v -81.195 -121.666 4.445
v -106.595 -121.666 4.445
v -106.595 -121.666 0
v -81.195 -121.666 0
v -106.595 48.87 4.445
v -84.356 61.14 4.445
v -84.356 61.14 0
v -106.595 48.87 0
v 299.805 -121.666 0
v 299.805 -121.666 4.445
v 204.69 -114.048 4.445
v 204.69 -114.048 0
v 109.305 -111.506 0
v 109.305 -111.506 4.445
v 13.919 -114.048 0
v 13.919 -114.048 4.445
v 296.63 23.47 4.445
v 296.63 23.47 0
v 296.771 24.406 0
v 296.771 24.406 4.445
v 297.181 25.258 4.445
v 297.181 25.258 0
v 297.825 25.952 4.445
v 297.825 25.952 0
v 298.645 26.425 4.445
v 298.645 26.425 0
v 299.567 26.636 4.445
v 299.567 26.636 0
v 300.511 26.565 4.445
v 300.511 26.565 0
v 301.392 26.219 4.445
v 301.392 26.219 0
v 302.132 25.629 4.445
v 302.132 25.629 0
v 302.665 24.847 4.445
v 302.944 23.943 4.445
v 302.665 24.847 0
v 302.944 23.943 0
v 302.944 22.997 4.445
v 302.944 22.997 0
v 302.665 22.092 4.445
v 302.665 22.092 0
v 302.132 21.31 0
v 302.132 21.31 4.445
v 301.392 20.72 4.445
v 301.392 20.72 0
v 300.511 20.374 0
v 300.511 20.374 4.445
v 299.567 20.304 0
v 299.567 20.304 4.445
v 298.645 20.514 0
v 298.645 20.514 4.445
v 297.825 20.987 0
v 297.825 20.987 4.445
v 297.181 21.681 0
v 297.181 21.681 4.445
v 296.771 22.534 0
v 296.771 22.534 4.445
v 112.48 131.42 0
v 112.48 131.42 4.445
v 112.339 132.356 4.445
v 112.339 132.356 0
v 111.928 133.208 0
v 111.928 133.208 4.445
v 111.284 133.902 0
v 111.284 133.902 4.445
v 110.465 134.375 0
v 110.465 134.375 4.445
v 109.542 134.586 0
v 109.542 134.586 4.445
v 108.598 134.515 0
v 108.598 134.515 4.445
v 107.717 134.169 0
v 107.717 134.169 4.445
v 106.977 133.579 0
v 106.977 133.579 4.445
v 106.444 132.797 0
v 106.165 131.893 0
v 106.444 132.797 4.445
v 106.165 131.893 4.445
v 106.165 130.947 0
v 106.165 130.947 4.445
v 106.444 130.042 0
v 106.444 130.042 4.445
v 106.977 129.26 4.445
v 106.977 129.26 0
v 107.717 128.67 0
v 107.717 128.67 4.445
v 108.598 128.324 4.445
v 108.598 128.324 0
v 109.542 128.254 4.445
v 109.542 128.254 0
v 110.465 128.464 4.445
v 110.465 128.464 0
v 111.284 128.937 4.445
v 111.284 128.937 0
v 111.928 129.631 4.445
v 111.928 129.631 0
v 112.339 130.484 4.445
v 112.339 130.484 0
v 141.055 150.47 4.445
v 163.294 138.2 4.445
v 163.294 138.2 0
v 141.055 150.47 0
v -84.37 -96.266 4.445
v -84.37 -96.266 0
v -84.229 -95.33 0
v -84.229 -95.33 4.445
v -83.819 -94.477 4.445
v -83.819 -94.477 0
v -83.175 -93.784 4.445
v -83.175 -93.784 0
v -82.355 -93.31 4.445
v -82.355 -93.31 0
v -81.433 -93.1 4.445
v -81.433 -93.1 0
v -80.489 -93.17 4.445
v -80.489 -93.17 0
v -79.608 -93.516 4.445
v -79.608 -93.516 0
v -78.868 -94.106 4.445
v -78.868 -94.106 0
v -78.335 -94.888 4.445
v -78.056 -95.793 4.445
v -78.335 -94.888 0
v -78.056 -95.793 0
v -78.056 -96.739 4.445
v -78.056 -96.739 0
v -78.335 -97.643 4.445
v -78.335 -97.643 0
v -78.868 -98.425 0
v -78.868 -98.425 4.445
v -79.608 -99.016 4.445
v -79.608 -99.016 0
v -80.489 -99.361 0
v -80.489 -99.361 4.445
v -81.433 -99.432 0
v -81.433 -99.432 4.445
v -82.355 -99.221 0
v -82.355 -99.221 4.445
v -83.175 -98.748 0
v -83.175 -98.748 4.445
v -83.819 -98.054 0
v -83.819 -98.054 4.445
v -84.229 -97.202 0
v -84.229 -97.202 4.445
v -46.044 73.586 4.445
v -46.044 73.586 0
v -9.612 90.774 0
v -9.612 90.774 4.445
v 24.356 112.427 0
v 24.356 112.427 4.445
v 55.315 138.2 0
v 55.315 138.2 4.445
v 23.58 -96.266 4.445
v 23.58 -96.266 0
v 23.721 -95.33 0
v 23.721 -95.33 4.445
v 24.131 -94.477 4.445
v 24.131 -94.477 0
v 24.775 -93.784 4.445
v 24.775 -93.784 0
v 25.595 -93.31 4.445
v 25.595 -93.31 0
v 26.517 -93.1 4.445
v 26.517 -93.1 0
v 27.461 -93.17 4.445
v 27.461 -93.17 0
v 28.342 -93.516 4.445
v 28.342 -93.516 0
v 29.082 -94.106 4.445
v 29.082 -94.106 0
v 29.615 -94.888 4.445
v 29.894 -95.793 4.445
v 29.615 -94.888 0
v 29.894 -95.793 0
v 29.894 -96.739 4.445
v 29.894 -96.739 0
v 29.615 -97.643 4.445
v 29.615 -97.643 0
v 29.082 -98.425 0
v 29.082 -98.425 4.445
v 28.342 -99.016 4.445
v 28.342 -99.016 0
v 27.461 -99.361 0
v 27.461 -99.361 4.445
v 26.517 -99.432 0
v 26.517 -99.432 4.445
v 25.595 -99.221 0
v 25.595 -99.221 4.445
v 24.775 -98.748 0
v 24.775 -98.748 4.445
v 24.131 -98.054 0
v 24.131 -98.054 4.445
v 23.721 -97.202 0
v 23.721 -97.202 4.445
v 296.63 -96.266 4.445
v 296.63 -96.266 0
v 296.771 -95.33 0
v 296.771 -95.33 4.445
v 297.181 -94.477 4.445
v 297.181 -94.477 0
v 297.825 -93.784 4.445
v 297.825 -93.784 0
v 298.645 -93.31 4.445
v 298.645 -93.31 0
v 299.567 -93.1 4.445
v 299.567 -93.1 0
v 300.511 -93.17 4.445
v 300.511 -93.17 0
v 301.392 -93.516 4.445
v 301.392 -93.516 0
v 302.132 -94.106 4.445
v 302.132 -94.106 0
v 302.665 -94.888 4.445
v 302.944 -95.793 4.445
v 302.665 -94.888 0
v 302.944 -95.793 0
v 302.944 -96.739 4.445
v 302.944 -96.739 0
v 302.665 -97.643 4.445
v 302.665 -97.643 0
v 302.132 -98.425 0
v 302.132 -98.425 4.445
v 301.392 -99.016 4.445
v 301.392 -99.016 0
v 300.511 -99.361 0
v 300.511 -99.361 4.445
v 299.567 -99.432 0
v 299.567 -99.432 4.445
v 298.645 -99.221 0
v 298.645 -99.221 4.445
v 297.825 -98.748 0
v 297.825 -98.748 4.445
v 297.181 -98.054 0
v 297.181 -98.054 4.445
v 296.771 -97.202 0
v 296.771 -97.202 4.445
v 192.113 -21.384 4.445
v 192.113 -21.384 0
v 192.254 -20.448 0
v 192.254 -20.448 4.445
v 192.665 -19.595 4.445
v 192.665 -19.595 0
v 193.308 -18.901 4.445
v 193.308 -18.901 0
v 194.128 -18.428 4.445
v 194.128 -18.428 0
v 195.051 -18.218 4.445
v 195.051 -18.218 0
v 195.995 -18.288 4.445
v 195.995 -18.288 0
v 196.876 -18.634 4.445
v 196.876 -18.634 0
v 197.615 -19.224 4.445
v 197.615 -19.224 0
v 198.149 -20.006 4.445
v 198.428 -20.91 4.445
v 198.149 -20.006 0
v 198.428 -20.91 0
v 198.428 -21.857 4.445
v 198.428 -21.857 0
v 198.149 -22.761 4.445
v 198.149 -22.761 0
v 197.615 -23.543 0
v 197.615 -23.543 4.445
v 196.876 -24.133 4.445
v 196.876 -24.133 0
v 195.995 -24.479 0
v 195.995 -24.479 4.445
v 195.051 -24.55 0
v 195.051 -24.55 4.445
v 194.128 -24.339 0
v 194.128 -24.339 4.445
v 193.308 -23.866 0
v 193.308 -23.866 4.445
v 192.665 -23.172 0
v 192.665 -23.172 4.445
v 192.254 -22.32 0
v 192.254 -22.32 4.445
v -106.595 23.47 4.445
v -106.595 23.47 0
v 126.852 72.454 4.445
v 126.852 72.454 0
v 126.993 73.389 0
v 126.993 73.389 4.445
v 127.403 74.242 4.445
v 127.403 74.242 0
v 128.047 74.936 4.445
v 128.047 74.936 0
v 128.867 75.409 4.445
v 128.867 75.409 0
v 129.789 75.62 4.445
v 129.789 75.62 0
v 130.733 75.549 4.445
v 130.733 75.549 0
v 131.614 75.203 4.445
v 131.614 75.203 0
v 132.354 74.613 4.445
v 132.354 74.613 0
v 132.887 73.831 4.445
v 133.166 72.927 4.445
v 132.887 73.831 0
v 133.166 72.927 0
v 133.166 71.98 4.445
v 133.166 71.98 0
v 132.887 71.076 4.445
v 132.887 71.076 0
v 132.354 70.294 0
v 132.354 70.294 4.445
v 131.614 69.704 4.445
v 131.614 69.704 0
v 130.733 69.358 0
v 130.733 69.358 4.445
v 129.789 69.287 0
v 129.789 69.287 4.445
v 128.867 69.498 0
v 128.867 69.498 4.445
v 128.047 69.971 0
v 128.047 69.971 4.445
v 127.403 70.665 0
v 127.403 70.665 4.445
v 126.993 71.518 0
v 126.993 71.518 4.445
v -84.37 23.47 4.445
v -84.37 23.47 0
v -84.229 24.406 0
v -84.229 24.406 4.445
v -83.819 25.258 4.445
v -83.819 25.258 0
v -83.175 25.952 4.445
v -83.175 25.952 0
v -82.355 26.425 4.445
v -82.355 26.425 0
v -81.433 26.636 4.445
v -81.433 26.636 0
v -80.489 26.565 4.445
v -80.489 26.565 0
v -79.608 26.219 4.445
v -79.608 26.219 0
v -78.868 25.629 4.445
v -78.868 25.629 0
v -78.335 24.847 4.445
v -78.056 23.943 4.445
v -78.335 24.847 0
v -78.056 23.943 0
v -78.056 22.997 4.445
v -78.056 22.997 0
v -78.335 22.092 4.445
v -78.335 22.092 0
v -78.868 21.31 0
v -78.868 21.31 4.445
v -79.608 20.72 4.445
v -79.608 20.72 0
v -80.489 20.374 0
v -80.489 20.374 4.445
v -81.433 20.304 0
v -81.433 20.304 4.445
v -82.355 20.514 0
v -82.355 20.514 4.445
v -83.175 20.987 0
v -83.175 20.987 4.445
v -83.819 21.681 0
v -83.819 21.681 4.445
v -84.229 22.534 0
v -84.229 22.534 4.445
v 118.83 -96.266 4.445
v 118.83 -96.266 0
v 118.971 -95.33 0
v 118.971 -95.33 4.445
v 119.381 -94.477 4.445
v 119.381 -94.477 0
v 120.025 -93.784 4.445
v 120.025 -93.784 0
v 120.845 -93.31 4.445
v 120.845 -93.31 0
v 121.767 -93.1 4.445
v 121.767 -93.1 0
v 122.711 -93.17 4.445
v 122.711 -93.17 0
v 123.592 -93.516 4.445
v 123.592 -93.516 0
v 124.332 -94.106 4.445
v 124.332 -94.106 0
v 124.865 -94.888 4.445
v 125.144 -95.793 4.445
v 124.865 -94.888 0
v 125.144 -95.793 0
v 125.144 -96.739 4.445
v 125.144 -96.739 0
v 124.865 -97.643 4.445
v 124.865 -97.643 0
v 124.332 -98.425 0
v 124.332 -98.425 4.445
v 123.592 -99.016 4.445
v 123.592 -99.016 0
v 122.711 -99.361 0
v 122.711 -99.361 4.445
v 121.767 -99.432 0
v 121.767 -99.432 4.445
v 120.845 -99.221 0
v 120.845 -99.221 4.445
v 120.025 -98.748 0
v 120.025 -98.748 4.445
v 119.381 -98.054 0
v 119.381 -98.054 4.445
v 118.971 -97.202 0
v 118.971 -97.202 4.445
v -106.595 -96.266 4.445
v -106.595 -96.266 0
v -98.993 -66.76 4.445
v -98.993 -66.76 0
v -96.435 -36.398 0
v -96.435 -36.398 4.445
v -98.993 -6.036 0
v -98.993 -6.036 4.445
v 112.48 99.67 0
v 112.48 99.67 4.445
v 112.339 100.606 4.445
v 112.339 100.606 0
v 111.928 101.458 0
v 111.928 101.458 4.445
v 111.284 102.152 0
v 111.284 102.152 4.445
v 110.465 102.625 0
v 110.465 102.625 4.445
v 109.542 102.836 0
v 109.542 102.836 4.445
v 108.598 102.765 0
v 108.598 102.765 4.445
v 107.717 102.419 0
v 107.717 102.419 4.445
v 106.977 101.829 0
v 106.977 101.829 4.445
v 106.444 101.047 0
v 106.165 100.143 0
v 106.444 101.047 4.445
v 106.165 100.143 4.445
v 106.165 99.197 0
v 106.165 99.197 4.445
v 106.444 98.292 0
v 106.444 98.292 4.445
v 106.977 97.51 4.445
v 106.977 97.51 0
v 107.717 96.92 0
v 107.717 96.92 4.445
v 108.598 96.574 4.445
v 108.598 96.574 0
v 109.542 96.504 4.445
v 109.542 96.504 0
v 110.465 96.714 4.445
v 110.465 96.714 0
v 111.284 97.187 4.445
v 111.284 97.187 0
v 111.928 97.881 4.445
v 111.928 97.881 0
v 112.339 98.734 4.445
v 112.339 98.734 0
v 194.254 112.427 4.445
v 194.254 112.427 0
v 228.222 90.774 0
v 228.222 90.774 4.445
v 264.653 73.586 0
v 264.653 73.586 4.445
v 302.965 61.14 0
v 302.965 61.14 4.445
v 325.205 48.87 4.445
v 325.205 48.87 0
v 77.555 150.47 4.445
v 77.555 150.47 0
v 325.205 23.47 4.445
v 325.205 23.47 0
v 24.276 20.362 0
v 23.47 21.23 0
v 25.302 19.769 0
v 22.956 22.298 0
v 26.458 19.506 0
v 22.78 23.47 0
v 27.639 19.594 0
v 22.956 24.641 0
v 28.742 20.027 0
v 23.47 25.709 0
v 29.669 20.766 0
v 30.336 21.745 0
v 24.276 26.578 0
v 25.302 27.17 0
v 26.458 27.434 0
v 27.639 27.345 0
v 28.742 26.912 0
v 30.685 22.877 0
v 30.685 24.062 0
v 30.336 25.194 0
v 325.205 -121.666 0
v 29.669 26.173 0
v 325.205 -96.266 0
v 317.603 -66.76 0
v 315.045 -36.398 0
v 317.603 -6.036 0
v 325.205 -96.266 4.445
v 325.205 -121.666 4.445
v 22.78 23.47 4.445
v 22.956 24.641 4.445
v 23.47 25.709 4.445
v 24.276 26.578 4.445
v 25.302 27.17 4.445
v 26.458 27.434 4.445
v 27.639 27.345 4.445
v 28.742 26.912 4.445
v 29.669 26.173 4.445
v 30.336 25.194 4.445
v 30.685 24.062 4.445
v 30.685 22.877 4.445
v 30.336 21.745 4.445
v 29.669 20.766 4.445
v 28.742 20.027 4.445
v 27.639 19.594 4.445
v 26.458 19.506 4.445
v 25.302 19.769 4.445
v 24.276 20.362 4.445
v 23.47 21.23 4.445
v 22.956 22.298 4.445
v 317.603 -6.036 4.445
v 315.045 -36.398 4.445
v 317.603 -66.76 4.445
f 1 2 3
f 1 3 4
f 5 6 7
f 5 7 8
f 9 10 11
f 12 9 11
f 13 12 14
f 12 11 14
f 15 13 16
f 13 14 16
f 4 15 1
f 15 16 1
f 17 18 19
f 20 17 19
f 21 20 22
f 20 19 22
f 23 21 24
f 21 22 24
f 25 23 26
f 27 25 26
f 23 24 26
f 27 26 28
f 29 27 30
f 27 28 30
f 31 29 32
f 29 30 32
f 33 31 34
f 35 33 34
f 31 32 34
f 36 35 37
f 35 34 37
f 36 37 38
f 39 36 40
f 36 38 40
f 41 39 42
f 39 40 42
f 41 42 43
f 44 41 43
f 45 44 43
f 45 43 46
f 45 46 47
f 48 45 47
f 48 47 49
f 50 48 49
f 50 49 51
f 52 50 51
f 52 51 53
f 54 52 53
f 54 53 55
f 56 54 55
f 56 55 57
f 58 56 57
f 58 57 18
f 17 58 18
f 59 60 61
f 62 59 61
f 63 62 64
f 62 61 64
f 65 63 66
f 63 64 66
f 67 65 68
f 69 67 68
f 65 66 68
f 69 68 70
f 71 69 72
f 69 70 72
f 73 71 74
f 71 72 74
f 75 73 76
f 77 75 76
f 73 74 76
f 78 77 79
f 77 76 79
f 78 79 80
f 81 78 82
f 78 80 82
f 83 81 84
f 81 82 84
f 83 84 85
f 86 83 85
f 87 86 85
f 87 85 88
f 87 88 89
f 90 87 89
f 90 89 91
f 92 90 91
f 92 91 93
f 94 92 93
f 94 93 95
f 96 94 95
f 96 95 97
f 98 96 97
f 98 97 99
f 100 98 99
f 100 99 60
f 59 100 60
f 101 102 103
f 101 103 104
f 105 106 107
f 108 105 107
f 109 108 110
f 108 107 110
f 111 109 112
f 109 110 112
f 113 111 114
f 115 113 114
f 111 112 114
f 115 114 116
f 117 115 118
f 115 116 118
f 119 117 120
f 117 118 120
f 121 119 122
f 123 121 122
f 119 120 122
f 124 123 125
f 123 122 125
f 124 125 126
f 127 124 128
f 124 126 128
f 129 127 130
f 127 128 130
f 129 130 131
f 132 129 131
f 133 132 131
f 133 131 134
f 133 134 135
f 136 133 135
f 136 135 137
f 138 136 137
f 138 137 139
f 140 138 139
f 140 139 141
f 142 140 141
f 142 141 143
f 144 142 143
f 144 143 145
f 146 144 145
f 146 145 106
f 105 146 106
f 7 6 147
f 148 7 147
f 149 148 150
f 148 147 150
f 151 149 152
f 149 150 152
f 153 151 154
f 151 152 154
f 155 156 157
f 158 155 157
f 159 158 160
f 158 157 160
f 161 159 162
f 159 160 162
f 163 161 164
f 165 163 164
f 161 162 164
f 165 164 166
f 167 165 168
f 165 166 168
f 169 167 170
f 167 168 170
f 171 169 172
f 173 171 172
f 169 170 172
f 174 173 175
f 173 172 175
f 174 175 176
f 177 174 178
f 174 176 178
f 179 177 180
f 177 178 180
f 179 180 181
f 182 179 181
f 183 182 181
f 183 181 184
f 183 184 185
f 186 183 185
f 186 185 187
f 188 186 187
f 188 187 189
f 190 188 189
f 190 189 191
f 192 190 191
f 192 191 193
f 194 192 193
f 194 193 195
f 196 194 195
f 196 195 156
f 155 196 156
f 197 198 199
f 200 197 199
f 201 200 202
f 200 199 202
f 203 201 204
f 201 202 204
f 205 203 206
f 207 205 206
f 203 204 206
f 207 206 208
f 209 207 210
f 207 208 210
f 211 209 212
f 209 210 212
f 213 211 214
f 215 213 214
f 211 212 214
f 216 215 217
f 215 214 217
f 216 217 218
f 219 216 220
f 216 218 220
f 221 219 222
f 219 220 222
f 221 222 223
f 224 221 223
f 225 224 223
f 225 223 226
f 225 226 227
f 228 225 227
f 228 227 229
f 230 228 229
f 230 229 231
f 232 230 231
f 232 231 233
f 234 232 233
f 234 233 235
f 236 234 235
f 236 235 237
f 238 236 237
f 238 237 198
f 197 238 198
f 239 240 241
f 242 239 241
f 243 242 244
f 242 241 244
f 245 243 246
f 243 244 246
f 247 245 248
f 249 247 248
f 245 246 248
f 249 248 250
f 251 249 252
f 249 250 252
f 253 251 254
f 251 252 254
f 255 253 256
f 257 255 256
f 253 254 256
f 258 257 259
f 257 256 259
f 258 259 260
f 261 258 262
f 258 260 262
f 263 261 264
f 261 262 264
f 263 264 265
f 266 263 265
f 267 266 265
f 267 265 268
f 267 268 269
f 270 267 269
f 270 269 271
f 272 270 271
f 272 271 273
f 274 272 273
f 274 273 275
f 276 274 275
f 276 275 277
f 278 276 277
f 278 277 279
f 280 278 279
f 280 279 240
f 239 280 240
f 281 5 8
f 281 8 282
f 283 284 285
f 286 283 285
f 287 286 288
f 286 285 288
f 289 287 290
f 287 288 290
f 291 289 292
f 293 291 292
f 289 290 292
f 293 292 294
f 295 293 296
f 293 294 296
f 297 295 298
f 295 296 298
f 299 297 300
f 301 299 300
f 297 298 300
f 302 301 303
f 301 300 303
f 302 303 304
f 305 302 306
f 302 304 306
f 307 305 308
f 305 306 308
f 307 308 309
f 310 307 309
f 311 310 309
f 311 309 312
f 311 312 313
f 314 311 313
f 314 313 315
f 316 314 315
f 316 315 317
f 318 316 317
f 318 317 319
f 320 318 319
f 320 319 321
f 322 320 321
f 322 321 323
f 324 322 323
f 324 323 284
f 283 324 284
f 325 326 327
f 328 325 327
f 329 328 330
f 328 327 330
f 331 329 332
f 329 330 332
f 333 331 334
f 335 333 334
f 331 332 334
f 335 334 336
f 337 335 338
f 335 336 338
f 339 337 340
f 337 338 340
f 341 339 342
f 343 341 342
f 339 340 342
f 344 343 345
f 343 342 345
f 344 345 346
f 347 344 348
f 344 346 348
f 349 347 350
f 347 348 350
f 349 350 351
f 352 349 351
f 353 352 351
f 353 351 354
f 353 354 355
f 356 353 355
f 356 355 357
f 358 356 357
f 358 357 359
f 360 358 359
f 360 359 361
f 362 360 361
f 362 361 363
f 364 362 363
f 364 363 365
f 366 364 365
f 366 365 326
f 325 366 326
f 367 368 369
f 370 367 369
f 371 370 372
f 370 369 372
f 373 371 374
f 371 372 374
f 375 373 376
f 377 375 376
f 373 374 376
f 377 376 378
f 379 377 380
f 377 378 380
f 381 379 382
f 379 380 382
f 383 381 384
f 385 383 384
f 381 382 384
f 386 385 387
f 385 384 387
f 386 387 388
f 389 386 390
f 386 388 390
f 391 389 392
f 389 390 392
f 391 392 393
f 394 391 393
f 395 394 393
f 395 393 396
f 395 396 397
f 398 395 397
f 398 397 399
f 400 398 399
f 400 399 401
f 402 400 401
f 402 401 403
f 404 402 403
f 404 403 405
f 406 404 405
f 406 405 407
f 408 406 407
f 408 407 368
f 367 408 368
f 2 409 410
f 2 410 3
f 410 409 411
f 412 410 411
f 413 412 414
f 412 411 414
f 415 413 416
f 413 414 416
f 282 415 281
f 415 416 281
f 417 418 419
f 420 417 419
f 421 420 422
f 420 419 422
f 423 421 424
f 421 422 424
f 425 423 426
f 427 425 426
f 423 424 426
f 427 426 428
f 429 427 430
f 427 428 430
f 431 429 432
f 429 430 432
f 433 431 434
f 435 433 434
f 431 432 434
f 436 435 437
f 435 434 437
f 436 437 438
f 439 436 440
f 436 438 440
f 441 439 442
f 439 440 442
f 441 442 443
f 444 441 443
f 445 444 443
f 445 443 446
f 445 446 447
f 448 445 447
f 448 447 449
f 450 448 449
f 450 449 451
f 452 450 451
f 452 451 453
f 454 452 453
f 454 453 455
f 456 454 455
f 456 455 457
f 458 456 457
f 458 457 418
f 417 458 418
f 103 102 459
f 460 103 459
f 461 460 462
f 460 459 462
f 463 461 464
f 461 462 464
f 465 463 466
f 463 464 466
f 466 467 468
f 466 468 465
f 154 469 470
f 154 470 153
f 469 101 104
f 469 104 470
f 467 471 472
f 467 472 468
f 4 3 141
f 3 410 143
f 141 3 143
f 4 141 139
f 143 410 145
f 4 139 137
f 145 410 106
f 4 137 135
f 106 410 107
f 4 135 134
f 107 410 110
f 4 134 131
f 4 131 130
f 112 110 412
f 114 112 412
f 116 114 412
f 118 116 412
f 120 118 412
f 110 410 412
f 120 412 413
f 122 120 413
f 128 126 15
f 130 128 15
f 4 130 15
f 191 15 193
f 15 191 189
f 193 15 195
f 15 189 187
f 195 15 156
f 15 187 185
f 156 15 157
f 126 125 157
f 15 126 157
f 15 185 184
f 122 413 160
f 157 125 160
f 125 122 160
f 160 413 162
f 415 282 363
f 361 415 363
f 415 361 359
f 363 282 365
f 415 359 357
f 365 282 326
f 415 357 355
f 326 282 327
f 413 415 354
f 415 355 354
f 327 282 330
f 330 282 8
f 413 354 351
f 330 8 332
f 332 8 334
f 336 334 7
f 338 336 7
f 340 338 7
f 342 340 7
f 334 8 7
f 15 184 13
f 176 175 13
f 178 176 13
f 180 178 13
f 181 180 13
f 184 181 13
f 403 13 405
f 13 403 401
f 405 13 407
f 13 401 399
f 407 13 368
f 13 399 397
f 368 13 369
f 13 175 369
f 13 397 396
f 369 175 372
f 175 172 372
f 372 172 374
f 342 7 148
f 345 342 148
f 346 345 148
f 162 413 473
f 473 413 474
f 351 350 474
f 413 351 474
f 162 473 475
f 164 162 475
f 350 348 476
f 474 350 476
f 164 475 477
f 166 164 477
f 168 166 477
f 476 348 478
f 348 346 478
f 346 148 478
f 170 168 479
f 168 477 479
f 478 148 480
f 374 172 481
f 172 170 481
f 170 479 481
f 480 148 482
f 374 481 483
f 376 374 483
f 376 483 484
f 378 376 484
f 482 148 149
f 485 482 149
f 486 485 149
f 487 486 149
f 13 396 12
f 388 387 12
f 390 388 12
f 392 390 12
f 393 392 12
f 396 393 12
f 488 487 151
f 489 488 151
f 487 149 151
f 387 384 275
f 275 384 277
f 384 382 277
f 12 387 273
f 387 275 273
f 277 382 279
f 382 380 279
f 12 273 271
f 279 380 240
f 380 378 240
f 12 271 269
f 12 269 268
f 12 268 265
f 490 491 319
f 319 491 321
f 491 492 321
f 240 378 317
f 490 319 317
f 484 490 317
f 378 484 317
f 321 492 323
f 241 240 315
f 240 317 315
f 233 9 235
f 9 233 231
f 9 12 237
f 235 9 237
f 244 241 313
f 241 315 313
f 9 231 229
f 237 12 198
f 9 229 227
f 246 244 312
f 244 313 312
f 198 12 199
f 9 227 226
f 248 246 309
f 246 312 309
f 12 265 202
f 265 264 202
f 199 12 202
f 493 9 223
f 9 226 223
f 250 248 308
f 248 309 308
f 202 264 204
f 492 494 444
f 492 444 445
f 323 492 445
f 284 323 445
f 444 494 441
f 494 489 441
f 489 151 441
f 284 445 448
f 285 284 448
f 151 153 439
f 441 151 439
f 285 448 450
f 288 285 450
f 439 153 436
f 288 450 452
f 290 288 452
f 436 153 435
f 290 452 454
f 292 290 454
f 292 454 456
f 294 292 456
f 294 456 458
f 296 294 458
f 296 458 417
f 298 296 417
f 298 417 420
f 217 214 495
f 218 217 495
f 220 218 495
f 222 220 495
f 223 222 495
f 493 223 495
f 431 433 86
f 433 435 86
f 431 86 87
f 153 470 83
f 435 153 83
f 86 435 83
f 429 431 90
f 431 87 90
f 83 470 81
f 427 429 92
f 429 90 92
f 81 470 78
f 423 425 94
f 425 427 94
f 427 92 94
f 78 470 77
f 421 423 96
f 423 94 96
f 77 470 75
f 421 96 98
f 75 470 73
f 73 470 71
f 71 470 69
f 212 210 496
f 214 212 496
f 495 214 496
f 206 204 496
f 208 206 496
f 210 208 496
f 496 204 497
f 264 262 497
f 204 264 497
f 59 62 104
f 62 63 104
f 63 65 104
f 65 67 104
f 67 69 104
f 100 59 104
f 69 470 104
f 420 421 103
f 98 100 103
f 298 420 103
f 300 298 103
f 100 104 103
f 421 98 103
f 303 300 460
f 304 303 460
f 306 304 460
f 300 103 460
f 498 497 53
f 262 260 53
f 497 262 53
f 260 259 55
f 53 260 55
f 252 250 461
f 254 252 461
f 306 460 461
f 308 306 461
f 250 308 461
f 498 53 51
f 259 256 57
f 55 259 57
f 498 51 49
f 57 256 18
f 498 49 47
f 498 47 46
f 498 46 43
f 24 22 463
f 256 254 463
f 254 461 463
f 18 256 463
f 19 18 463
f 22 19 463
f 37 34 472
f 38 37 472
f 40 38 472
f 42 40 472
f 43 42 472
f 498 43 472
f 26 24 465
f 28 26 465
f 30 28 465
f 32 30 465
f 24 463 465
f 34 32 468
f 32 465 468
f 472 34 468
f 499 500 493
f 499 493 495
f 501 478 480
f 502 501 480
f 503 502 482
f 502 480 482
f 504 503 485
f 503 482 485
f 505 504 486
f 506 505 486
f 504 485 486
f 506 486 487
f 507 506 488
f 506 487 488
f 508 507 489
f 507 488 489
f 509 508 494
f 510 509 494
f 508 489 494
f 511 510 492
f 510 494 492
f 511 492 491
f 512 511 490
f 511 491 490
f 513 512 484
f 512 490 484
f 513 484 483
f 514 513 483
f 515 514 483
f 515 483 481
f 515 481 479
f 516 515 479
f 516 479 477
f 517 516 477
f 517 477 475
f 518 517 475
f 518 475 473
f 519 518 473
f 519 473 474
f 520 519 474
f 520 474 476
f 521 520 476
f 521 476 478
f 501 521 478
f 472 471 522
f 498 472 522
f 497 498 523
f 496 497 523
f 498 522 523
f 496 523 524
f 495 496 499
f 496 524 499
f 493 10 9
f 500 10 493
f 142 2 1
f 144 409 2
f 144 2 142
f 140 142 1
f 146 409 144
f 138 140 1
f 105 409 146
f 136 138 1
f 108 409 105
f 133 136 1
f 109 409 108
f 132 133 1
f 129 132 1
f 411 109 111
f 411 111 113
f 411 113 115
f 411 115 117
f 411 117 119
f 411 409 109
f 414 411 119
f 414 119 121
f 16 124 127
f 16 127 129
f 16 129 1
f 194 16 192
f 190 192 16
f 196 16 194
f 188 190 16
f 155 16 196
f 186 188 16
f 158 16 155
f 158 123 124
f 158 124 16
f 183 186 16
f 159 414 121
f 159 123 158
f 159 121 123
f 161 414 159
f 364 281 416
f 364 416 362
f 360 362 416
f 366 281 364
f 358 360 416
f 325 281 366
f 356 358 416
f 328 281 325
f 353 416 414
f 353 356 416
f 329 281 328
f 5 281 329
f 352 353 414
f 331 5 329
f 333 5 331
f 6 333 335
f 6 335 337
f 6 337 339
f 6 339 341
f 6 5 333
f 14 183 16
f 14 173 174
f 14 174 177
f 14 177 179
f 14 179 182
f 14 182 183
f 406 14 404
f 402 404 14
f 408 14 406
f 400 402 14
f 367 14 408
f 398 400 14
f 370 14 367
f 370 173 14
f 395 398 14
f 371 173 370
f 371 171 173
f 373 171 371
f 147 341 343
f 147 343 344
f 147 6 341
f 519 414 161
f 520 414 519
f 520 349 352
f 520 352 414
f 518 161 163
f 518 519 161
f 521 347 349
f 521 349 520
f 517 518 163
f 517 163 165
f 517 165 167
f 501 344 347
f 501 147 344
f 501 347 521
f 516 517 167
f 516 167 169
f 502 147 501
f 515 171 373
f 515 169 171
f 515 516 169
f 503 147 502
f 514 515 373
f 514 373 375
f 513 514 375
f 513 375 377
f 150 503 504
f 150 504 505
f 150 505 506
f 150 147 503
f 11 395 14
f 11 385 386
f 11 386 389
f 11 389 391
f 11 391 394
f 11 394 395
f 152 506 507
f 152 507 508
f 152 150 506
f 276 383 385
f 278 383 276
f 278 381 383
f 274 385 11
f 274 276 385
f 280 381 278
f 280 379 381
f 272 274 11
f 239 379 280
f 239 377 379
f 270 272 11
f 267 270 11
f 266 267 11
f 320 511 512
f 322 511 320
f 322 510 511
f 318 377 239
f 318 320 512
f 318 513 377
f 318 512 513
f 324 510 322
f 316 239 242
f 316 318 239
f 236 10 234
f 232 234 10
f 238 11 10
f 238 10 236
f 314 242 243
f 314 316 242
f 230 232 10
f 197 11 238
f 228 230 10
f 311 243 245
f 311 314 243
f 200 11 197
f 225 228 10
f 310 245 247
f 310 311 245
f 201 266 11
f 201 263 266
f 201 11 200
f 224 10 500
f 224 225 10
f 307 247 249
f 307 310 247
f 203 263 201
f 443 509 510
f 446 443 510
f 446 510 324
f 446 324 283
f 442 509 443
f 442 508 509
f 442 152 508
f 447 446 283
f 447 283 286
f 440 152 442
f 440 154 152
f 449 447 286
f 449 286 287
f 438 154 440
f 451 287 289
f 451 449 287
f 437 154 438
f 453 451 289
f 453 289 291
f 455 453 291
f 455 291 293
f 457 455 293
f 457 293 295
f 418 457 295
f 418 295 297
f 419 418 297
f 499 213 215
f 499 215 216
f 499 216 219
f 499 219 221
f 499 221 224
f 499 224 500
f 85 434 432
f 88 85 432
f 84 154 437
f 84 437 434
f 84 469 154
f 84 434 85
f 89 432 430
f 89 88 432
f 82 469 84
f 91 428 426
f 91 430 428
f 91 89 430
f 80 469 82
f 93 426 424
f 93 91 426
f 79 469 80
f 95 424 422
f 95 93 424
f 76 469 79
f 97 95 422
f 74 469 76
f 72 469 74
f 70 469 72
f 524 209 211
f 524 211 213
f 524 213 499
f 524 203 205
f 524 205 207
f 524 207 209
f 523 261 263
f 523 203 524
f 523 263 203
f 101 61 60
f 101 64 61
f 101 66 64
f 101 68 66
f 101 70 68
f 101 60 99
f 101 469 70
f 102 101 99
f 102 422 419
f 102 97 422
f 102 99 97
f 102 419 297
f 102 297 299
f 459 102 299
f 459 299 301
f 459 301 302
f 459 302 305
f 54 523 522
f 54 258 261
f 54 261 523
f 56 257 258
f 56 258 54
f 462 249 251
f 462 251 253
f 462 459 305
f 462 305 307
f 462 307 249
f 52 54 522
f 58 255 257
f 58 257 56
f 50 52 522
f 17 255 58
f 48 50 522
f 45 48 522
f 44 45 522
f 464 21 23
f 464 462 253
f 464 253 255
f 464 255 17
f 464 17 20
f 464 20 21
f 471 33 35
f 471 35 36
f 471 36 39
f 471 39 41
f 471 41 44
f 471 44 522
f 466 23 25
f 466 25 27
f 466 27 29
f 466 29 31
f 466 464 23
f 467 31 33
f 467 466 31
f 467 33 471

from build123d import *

# Parameters (mm, degrees)
SKETCH2_W           = 635
SKETCH2_H           = 635
BOSS_EXTRUDE3_DEPTH = 4.445
SKETCH3_R           = 3.175
SKETCH3_R_2         = 3.9751
CUT_EXTRUDE1_DEPTH  = 514.410627343
SKETCH5_W           = 635
SKETCH5_H           = 635
CUT_EXTRUDE2_DEPTH  = 514.410627343
CUT_EXTRUDE3_DEPTH  = 359.355916807
SKETCH10_R          = 3.175
CUT_EXTRUDE5_DEPTH  = 359.355916807


with BuildPart() as part:
    # Sketch2 → Boss-Extrude3 (new body)
    with BuildSketch(Plane.XY):
        with Locations((84.381748098, -1.971086)):
            Rectangle(SKETCH2_W, SKETCH2_H)
    extrude(amount=BOSS_EXTRUDE3_DEPTH)

    # Sketch3 → Cut-Extrude1 (cut, through all)
    with BuildSketch(Plane(origin=(0, 0, 0), x_dir=(-1, 0, 0), z_dir=(0, 0, -1))):
        with Locations((-130.02651813, 72.45351862)):
            Circle(SKETCH3_R)
        with Locations((-195.288059763, -21.383687133)):
            Circle(SKETCH3_R)
        with Locations((-122.004659563, -96.265887155)):
            Circle(SKETCH3_R)
        with Locations((-26.754659563, -96.265887155)):
            Circle(SKETCH3_R)
        with Locations((-26.754659563, 23.469712845)):
            Circle(SKETCH3_R_2)
        with Locations((81.195340437, -96.265887155)):
            Circle(SKETCH3_R)
        with Locations((-299.804659563, -96.265887155)):
            Circle(SKETCH3_R)
        with Locations((81.195340437, 23.469712845)):
            Circle(SKETCH3_R)
        with Locations((-299.804659563, 23.469712845)):
            Circle(SKETCH3_R)
    extrude(amount=-CUT_EXTRUDE1_DEPTH, mode=Mode.SUBTRACT)

    # Sketch5 → Cut-Extrude2 (cut, through all)
    with BuildSketch(Plane.XY.offset(4.445)):
        with Locations((84.381748098, -1.971086)):
            Rectangle(SKETCH5_W, SKETCH5_H)
        Polygon((-106.595340437, -121.665887155), (325.204659563, -121.665887155), (325.204659563, 48.869712845), (141.054659563, 150.469712845), (77.554659563, 150.469712845), (-106.595340437, 48.869712845), align=None, mode=Mode.SUBTRACT)
    extrude(amount=-CUT_EXTRUDE2_DEPTH, mode=Mode.SUBTRACT)

    # Sketch7 → Cut-Extrude3 (cut, through all)
    with BuildSketch(Plane.XY.offset(4.445)):
        with BuildLine():
            ThreePointArc((-106.595340437, -96.265887155), (-96.435340437, -36.398087155), (-106.595340437, 23.469712845))
            Line((-106.595340437, 23.469712845), (-106.595340437, -96.265887155))
        make_face()
        with BuildLine():
            ThreePointArc((299.804659563, -121.665887155), (109.304659563, -111.505887155), (-81.195340437, -121.665887155))
            Line((-81.195340437, -121.665887155), (299.804659563, -121.665887155))
        make_face()
        with BuildLine():
            ThreePointArc((325.204659563, 23.469712845), (315.044659563, -36.398087155), (325.204659563, -96.265887155))
            Line((325.204659563, -96.265887155), (325.204659563, 23.469712845))
        make_face()
        with BuildLine():
            Line((55.314986389, 138.199548335), (-84.355667262, 61.139877355))
            ThreePointArc((-84.355667262, 61.139877355), (-9.612274633, 90.773843575), (55.314986389, 138.199548335))
        make_face()
        with BuildLine():
            Line((302.964986389, 61.139877355), (163.294332738, 138.199548335))
            ThreePointArc((163.294332738, 138.199548335), (228.221593759, 90.773843575), (302.964986389, 61.139877355))
        make_face()
    extrude(amount=-CUT_EXTRUDE3_DEPTH, mode=Mode.SUBTRACT)

    # Sketch10 → Cut-Extrude5 (cut, through all)
    with BuildSketch(Plane.XY.offset(4.445)):
        with Locations((109.304659563, 131.419712845)):
            Circle(SKETCH10_R)
        with Locations((109.304659563, 99.669712845)):
            Circle(SKETCH10_R)
    extrude(amount=-CUT_EXTRUDE5_DEPTH, mode=Mode.SUBTRACT)


solid = part.part
